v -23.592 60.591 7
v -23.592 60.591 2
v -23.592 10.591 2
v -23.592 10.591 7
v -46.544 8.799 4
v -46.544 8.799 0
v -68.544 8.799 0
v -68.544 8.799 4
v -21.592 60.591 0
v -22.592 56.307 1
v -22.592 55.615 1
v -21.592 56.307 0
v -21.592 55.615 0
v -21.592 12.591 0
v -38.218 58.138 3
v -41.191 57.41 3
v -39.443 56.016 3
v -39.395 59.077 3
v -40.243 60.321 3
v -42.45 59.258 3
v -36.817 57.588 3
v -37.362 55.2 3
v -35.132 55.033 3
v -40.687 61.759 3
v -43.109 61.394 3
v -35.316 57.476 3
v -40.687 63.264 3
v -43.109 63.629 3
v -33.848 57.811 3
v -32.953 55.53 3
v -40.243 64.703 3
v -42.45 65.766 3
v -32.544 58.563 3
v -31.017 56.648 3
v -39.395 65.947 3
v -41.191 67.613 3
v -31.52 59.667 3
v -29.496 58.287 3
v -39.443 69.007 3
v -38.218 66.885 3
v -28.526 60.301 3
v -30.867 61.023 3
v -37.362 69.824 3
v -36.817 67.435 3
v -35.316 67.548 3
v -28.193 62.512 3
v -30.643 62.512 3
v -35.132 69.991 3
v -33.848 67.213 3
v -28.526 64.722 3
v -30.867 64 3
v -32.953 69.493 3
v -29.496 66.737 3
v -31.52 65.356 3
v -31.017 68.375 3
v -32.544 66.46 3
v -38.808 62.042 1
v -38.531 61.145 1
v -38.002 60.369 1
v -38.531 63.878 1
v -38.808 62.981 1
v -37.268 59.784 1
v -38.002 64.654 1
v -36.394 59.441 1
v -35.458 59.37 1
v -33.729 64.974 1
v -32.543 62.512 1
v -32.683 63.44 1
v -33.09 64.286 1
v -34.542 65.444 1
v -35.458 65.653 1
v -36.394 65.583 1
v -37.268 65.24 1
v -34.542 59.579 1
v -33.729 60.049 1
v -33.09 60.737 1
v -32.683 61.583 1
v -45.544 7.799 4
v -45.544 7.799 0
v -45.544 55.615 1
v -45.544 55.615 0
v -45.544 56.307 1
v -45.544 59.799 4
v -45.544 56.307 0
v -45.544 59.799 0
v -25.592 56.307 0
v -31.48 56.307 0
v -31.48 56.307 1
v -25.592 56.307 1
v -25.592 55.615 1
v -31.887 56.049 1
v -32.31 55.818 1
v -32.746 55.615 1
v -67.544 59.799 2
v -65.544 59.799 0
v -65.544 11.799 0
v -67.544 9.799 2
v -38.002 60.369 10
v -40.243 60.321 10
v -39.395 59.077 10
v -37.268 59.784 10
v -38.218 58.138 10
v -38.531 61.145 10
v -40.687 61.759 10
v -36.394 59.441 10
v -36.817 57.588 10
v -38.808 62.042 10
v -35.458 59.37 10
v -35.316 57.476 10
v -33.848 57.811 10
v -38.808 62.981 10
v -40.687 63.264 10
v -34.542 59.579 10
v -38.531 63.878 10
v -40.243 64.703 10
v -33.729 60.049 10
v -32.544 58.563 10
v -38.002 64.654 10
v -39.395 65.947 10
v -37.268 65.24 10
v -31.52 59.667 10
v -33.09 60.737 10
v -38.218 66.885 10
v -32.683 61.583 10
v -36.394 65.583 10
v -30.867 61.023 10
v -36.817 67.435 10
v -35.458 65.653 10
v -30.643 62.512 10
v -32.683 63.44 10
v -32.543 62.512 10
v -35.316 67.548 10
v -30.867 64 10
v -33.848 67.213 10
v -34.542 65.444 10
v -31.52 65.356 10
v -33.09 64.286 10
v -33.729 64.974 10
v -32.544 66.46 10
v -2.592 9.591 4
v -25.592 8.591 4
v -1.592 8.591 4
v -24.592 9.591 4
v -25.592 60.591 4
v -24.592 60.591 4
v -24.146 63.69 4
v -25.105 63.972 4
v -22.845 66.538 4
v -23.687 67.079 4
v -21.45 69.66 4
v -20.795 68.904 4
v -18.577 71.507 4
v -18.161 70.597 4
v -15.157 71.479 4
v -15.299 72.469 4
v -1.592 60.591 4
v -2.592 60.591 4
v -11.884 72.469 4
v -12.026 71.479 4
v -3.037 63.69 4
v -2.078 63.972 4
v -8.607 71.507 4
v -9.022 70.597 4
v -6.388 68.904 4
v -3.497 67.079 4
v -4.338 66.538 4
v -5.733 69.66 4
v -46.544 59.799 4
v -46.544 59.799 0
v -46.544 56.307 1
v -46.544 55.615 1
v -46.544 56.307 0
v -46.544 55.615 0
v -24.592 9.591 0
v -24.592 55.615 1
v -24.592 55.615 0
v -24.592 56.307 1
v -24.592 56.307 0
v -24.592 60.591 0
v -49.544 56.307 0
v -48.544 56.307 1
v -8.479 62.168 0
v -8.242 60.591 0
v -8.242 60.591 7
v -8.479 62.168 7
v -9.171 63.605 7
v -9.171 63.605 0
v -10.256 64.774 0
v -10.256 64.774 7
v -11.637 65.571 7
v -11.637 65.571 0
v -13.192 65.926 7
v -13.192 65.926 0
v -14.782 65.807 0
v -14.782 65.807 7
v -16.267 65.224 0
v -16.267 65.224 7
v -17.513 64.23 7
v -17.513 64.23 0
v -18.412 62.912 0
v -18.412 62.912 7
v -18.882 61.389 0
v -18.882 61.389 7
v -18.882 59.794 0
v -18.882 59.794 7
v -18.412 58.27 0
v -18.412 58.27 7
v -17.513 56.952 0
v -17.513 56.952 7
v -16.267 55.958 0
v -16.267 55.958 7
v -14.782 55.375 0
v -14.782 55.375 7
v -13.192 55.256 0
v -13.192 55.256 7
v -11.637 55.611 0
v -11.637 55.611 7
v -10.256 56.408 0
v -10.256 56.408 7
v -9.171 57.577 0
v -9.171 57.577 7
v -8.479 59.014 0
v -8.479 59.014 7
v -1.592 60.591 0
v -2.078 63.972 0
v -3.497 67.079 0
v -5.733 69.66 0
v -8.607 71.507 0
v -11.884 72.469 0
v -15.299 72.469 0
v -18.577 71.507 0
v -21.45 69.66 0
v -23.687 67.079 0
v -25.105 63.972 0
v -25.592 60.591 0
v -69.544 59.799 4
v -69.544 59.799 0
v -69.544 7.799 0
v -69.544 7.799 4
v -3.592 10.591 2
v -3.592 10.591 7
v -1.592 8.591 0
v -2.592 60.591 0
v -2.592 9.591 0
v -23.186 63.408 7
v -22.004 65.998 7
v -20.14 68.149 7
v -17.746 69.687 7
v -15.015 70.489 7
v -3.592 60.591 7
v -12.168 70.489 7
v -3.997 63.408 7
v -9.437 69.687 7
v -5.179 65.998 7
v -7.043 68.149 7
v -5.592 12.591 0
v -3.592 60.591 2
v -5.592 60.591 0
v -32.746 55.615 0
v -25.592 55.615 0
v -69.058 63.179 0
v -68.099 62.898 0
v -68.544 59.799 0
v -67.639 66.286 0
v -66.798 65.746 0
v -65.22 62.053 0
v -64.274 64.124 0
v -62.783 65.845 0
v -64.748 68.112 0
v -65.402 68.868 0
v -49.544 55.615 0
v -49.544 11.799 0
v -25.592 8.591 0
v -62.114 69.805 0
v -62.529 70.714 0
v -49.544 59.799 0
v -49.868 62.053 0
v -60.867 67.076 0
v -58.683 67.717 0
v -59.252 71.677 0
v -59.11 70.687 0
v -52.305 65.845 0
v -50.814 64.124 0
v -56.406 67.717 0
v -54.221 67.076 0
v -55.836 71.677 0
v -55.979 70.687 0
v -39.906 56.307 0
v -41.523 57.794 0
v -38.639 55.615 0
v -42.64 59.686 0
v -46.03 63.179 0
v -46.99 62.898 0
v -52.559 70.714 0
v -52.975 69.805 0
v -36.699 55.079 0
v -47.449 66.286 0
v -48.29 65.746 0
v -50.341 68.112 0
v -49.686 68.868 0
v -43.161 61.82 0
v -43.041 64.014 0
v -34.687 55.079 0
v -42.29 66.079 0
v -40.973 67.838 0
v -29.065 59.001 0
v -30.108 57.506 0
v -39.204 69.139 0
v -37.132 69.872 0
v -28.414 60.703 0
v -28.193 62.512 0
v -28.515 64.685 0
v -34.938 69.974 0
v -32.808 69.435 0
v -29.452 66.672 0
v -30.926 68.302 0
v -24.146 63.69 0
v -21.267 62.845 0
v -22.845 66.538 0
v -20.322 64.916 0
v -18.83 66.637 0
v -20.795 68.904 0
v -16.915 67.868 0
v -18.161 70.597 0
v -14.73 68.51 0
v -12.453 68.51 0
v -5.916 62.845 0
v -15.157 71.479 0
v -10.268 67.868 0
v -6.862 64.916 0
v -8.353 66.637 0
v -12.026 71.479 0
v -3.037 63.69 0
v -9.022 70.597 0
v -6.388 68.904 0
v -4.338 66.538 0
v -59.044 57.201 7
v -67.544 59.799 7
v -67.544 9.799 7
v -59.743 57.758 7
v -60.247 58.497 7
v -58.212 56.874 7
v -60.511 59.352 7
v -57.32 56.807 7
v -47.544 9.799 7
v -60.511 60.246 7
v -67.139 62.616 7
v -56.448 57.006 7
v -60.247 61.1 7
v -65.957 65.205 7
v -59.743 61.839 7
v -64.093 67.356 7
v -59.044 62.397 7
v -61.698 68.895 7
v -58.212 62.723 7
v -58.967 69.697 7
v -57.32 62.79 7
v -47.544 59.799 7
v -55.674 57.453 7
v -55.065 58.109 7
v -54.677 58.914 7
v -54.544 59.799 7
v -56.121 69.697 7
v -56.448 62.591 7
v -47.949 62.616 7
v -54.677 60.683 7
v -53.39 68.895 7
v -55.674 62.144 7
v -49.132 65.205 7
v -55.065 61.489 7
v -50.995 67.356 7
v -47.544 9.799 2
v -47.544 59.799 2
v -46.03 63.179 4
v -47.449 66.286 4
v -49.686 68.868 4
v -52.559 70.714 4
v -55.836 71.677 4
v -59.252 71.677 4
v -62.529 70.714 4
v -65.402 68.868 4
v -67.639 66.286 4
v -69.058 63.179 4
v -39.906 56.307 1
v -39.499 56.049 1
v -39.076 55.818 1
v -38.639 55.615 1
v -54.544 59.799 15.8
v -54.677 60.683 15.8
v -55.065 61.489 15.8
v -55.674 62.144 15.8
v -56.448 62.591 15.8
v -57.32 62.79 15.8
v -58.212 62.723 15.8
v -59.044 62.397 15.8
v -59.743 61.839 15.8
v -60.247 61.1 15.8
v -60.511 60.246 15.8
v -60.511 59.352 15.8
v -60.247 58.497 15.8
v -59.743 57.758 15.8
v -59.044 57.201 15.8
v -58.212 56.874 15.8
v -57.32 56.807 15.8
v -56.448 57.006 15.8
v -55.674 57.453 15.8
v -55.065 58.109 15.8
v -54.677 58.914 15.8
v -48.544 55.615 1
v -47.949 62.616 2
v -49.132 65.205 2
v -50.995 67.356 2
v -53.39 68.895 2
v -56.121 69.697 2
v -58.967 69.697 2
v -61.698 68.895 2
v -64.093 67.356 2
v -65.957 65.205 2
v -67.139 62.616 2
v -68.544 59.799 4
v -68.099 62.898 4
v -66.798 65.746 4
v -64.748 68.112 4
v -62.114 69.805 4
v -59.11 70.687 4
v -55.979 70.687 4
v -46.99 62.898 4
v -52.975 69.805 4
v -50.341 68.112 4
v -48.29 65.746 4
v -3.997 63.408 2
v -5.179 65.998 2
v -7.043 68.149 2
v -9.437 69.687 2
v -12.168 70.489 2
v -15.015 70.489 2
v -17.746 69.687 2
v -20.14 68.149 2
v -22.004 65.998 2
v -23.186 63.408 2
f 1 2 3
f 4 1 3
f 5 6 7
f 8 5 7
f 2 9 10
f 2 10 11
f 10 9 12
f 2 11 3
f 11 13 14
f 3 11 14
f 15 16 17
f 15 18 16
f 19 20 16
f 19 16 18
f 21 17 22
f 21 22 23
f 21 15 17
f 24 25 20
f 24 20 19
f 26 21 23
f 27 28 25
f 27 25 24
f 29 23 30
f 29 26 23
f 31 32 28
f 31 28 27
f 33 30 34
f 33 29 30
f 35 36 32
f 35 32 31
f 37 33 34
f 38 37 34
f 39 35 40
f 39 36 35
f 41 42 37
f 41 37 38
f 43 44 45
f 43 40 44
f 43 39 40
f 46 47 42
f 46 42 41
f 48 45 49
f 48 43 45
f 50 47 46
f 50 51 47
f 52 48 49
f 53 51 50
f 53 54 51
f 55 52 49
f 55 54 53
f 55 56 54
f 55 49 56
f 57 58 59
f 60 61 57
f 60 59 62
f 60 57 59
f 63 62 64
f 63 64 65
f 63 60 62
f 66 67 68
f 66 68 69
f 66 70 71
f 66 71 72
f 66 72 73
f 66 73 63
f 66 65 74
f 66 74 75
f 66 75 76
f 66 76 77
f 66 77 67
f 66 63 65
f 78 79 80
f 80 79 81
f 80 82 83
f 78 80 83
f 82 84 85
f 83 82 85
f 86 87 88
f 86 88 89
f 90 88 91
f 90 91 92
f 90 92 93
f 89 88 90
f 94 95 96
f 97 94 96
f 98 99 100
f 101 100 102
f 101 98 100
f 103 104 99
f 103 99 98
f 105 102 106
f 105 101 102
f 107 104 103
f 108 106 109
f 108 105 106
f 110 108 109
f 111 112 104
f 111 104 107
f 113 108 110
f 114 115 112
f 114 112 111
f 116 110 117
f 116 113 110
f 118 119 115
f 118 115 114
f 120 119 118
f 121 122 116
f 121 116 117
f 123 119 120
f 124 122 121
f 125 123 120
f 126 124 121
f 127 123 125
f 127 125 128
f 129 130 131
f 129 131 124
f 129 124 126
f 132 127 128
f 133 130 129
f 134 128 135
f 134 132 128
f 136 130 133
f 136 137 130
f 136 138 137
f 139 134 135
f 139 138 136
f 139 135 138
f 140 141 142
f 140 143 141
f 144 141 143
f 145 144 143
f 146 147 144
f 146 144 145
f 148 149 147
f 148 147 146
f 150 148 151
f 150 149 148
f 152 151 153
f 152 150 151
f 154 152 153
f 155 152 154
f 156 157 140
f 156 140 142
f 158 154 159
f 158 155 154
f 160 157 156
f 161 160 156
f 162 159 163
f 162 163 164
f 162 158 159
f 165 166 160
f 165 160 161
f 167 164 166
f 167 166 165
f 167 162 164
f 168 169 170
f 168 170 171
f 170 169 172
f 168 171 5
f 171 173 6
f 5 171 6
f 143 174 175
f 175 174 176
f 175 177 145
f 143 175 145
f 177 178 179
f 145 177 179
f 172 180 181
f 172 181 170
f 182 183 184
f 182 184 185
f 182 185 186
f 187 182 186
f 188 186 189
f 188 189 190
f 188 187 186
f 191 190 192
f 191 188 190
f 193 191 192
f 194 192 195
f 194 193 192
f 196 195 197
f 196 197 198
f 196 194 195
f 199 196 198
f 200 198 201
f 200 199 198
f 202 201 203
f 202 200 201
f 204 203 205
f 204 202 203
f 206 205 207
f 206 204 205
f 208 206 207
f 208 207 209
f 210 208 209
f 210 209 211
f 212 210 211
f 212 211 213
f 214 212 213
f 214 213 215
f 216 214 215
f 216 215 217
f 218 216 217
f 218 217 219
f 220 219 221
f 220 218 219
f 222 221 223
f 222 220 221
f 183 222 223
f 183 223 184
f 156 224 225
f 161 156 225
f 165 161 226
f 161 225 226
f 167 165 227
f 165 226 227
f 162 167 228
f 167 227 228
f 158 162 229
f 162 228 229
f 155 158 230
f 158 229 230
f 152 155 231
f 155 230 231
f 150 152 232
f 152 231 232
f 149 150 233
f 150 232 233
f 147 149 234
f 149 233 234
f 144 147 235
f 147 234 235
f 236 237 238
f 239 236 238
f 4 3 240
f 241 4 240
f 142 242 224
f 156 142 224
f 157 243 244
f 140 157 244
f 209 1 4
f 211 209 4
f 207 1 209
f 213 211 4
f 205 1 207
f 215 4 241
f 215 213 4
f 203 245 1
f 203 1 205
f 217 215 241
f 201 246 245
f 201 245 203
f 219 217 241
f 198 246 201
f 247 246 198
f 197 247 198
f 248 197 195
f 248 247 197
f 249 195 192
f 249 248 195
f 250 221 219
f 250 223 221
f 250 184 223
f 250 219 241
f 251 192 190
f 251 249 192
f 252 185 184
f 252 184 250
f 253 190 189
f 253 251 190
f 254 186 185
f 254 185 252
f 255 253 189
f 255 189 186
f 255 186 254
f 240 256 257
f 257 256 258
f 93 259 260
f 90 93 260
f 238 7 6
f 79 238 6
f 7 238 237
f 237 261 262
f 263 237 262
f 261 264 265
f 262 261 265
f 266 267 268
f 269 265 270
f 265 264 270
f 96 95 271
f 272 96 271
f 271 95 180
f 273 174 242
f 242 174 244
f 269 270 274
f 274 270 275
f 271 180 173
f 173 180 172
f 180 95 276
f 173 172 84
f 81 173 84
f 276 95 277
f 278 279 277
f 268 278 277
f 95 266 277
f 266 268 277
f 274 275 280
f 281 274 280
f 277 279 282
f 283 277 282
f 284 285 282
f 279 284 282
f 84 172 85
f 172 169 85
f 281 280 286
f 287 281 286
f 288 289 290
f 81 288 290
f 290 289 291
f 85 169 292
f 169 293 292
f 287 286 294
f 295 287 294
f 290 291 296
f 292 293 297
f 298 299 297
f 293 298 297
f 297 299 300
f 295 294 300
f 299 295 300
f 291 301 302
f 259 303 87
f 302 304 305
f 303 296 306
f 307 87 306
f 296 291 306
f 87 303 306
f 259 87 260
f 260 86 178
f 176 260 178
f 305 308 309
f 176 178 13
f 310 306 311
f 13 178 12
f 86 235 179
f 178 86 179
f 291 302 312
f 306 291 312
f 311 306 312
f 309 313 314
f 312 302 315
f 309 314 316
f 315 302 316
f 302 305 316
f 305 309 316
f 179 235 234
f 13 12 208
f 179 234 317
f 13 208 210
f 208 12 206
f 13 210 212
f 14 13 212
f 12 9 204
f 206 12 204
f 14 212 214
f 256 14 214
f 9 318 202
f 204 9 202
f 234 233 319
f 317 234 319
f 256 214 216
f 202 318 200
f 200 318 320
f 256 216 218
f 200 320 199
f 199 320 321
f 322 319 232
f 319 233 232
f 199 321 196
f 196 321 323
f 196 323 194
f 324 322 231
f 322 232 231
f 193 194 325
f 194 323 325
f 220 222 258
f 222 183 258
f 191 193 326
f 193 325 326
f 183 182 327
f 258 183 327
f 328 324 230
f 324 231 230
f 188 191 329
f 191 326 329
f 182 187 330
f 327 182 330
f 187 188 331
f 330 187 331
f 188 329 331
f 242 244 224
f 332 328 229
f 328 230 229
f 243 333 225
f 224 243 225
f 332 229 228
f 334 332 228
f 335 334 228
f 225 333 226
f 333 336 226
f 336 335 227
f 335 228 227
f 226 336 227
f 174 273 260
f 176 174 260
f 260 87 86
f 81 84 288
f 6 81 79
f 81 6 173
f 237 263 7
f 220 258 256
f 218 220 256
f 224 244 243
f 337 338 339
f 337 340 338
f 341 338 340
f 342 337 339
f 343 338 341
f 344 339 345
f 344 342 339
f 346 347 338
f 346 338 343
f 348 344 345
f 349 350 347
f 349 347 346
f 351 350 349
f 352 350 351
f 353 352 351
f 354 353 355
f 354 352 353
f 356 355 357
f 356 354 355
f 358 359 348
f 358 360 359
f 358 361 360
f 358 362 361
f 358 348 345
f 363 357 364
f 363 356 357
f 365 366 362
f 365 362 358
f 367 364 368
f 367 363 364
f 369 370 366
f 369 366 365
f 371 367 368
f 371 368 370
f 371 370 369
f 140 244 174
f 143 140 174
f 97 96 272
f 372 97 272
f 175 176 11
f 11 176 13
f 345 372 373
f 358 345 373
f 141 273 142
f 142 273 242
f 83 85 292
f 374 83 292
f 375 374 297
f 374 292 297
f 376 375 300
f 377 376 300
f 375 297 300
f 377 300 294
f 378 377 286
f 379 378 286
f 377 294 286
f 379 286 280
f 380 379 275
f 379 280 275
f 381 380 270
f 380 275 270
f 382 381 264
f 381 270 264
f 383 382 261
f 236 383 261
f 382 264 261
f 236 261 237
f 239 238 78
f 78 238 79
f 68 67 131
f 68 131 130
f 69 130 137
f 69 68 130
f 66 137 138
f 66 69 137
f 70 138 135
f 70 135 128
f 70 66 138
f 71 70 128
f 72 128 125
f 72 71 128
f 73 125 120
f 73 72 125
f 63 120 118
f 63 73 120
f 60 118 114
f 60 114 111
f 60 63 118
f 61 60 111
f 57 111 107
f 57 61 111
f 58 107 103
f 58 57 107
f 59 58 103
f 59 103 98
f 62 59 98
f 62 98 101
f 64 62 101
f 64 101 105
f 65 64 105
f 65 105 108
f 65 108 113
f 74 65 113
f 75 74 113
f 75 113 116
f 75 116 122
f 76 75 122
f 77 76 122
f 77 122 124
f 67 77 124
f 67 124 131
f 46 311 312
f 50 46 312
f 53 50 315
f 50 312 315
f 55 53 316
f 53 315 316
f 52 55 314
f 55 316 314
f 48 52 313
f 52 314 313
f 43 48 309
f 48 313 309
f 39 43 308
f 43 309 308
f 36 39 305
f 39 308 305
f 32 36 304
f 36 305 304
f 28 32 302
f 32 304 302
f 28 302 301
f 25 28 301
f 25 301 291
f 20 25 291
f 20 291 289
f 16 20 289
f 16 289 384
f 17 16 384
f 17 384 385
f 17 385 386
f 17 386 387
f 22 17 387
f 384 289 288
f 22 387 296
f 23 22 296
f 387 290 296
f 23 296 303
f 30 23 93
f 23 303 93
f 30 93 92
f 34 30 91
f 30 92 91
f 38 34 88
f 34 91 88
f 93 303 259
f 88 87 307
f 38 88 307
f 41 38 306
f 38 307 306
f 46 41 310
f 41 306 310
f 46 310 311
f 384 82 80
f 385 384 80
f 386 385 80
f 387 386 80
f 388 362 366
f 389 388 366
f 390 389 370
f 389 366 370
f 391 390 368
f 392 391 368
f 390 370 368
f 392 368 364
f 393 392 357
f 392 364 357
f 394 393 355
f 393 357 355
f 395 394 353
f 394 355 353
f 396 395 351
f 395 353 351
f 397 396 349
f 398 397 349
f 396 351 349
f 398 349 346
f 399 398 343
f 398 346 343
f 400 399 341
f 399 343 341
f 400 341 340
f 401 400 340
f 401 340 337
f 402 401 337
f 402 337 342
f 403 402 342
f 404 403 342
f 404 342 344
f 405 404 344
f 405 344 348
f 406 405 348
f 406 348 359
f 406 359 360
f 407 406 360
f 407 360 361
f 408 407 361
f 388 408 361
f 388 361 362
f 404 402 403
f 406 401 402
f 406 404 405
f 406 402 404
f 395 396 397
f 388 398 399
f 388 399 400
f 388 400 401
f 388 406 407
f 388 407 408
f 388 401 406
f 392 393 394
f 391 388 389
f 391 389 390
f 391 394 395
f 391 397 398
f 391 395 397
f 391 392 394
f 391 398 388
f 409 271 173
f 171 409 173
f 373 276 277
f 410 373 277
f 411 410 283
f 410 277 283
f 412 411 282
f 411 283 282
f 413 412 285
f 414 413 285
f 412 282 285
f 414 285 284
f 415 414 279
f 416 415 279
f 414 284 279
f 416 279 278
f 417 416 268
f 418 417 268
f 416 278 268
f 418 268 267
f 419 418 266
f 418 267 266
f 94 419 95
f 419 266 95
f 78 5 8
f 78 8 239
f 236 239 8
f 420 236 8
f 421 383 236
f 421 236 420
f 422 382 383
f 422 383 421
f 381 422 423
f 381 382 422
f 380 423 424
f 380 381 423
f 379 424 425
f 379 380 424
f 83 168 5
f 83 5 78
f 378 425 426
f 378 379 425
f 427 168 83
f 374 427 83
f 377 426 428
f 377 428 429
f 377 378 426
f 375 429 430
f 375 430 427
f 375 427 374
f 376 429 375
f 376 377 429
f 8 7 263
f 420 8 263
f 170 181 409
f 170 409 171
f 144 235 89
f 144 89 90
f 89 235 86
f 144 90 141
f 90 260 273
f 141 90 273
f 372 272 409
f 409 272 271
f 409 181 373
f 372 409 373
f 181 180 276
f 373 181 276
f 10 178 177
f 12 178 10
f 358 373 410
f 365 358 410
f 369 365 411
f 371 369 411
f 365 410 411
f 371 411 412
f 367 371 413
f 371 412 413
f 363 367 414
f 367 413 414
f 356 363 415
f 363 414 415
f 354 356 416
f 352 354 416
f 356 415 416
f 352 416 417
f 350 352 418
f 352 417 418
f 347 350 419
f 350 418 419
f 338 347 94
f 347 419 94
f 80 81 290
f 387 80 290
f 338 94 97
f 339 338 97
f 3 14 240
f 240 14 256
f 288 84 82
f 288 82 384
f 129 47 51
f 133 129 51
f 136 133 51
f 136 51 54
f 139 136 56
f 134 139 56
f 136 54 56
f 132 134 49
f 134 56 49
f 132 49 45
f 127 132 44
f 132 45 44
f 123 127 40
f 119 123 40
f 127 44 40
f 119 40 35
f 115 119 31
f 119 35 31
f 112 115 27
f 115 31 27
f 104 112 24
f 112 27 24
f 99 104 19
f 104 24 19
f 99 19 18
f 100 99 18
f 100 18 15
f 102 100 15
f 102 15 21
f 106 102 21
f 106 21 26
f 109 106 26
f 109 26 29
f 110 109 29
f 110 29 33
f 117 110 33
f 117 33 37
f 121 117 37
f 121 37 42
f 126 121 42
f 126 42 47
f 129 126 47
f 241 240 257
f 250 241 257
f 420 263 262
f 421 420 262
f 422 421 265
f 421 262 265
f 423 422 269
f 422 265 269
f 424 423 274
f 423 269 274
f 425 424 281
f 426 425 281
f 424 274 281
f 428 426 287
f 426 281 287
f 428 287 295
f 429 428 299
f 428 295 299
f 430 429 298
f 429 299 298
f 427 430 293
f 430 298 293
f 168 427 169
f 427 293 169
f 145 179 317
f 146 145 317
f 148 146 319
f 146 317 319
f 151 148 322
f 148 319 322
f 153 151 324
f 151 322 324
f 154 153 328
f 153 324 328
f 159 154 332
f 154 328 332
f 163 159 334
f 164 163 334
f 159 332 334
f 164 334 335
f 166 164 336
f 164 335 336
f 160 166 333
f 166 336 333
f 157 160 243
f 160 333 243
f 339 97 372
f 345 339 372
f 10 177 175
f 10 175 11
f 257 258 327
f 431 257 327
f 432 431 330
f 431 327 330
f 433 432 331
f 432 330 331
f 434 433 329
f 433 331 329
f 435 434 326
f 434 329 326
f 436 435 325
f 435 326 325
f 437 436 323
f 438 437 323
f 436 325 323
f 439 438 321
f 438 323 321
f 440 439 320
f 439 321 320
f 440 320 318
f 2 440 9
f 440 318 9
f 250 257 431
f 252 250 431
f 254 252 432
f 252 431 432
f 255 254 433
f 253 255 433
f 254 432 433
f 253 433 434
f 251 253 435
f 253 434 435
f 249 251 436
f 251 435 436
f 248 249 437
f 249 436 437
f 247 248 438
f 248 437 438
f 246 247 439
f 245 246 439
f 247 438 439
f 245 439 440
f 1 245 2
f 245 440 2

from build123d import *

# Parameters (mm, degrees)
F1_R      = 3
F5_DEPTH  = 7
F6_SIZE   = 2
F7_DEPTH  = 15.8
F1_R_2    = 5.35
F8_DEPTH  = 7
F9_SIZE   = 2
F1_R_3    = 7.5
F1_R_4    = 5.05
F10_DEPTH = 3
F1_R_5    = 3.15
F11_DEPTH = 10
F12_DEPTH = 1
F13_DEPTH = 4
F14_W     = 38.3726581931
F14_H     = 0.6922930479
F15_DEPTH = 1


with BuildPart() as f5:
    # F1 (on Top) → F5 (new body)
    with BuildSketch(Plane.XY):
        with BuildLine():
            Line((-67.5440824628, 59.7986807566), (-67.5440824628, 9.7986807566))
            Line((-67.5440824628, 9.7986807566), (-47.5440824628, 9.7986807566))
            Line((-47.5440824628, 9.7986807566), (-47.5440824628, 59.7986807566))
            ThreePointArc((-47.5440824628, 59.7986807566), (-57.5440824628, 69.7986807566), (-67.5440824628, 59.7986807566))
        make_face()
        with Locations((-57.5440824628, 59.7986807566)):
            Circle(F1_R, mode=Mode.SUBTRACT)
    extrude(amount=F5_DEPTH)

    # F6
    f6_edges = [f5.edges().sort_by_distance(p)[0] for p in [
        (-57.544082, 9.798681, 0),
        (-47.544082, 34.798681, 0),
        (-57.544082, 69.798681, 0),
        (-67.544082, 34.798681, 0),
    ]]
    chamfer(f6_edges, length=F6_SIZE)

    # F1 (on Top) → F7 (join)
    with BuildSketch(Plane.XY):
        with Locations((-57.5440824628, 59.7986807566)):
            Circle(F1_R)
    extrude(amount=F7_DEPTH)



with BuildPart() as f8:
    # F1 (on Top) → F8 (new body)
    with BuildSketch(Plane.XY):
        with BuildLine():
            ThreePointArc((-3.5915456533, 60.5911472063), (-13.5915456533, 70.5911472063), (-23.5915456533, 60.5911472063))
            Line((-23.5915456533, 60.5911472063), (-23.5915456533, 10.5911472063))
            Line((-23.5915456533, 10.5911472063), (-3.5915456533, 10.5911472063))
            Line((-3.5915456533, 10.5911472063), (-3.5915456533, 60.5911472063))
        make_face()
        with Locations((-13.5915456533, 60.5911472063)):
            Circle(F1_R_2, mode=Mode.SUBTRACT)
    extrude(amount=F8_DEPTH)

    # F9
    f9_edges = [f8.edges().sort_by_distance(p)[0] for p in [
        (-13.591546, 10.591147, 0),
        (-3.591546, 35.591147, 0),
        (-13.591546, 70.591147, 0),
        (-23.591546, 35.591147, 0),
    ]]
    chamfer(f9_edges, length=F9_SIZE)


with BuildPart() as f10:
    # F1 (on Top) → F10 (new body)
    with BuildSketch(Plane.XY):
        with Locations((-35.6929131355, 62.5116448375)):
            Circle(F1_R_3)
        with Locations((-35.6929131355, 62.5116448375)):
            Circle(F1_R_4, mode=Mode.SUBTRACT)
    extrude(amount=F10_DEPTH)

    # F1 (on Top) → F11 (join)
    with BuildSketch(Plane.XY):
        with Locations((-35.6929131355, 62.5116448375)):
            Circle(F1_R_4)
        with Locations((-35.6929131355, 62.5116448375)):
            Circle(F1_R_5, mode=Mode.SUBTRACT)
    extrude(amount=F11_DEPTH)

    # F1 (on Top) → F12 (join)
    with BuildSketch(Plane.XY):
        with Locations((-35.6929131355, 62.5116448375)):
            Circle(F1_R_5)
    extrude(amount=F12_DEPTH)


with BuildPart() as f13:
    # F1 (on Top) → F13 (new body)
    with BuildSketch(Plane.XY):
        with BuildLine():
            Line((-69.5440824628, 59.7986807566), (-69.5440824628, 7.7986807566))
            Line((-69.5440824628, 7.7986807566), (-45.5440824628, 7.7986807566))
            Line((-45.5440824628, 7.7986807566), (-45.5440824628, 59.7986807566))
            ThreePointArc((-45.5440824628, 59.7986807566), (-57.5440824628, 71.7986807566), (-69.5440824628, 59.7986807566))
        make_face()
        with BuildLine():
            ThreePointArc((-68.5440824628, 59.7986807566), (-57.5440824628, 70.7986807566), (-46.5440824628, 59.7986807566))
            Line((-46.5440824628, 59.7986807566), (-46.5440824628, 8.7986807566))
            Line((-46.5440824628, 8.7986807566), (-68.5440824628, 8.7986807566))
            Line((-68.5440824628, 8.7986807566), (-68.5440824628, 59.7986807566))
        make_face(mode=Mode.SUBTRACT)
    extrude(amount=F13_DEPTH)


with BuildPart() as f13b:
    # F1 (on Top) → F13, piece 2 (new body)
    with BuildSketch(Plane.XY):
        with BuildLine():
            Line((-25.5915456533, 60.5911472063), (-25.5915456533, 8.5911472063))
            Line((-25.5915456533, 8.5911472063), (-1.5915456533, 8.5911472063))
            Line((-1.5915456533, 8.5911472063), (-1.5915456533, 60.5911472063))
            ThreePointArc((-1.5915456533, 60.5911472063), (-13.5915456533, 72.5911472063), (-25.5915456533, 60.5911472063))
        make_face()
        with BuildLine():
            Line((-2.5915456533, 9.5911472063), (-24.5915456533, 9.5911472063))
            Line((-24.5915456533, 9.5911472063), (-24.5915456533, 60.5911472063))
            ThreePointArc((-24.5915456533, 60.5911472063), (-13.5915456533, 71.5911472063), (-2.5915456533, 60.5911472063))
            Line((-2.5915456533, 60.5911472063), (-2.5915456533, 9.5911472063))
        make_face(mode=Mode.SUBTRACT)
    extrude(amount=F13_DEPTH)


with BuildPart() as f5_1:
    add(f5.part)

    add(f8.part)  # F15 merges F8

    add(f10.part)  # F15 merges F10

    add(f13.part)  # F15 merges F13

    add(f13b.part)  # F15 merges F13b
    # F14 (on Top) → F15 (join)
    with BuildSketch(Plane.XY):
        with Locations((-36.1423902214, 55.9608265758)):
            Rectangle(F14_W, F14_H)
    extrude(amount=F15_DEPTH)


solid = f5_1.part
